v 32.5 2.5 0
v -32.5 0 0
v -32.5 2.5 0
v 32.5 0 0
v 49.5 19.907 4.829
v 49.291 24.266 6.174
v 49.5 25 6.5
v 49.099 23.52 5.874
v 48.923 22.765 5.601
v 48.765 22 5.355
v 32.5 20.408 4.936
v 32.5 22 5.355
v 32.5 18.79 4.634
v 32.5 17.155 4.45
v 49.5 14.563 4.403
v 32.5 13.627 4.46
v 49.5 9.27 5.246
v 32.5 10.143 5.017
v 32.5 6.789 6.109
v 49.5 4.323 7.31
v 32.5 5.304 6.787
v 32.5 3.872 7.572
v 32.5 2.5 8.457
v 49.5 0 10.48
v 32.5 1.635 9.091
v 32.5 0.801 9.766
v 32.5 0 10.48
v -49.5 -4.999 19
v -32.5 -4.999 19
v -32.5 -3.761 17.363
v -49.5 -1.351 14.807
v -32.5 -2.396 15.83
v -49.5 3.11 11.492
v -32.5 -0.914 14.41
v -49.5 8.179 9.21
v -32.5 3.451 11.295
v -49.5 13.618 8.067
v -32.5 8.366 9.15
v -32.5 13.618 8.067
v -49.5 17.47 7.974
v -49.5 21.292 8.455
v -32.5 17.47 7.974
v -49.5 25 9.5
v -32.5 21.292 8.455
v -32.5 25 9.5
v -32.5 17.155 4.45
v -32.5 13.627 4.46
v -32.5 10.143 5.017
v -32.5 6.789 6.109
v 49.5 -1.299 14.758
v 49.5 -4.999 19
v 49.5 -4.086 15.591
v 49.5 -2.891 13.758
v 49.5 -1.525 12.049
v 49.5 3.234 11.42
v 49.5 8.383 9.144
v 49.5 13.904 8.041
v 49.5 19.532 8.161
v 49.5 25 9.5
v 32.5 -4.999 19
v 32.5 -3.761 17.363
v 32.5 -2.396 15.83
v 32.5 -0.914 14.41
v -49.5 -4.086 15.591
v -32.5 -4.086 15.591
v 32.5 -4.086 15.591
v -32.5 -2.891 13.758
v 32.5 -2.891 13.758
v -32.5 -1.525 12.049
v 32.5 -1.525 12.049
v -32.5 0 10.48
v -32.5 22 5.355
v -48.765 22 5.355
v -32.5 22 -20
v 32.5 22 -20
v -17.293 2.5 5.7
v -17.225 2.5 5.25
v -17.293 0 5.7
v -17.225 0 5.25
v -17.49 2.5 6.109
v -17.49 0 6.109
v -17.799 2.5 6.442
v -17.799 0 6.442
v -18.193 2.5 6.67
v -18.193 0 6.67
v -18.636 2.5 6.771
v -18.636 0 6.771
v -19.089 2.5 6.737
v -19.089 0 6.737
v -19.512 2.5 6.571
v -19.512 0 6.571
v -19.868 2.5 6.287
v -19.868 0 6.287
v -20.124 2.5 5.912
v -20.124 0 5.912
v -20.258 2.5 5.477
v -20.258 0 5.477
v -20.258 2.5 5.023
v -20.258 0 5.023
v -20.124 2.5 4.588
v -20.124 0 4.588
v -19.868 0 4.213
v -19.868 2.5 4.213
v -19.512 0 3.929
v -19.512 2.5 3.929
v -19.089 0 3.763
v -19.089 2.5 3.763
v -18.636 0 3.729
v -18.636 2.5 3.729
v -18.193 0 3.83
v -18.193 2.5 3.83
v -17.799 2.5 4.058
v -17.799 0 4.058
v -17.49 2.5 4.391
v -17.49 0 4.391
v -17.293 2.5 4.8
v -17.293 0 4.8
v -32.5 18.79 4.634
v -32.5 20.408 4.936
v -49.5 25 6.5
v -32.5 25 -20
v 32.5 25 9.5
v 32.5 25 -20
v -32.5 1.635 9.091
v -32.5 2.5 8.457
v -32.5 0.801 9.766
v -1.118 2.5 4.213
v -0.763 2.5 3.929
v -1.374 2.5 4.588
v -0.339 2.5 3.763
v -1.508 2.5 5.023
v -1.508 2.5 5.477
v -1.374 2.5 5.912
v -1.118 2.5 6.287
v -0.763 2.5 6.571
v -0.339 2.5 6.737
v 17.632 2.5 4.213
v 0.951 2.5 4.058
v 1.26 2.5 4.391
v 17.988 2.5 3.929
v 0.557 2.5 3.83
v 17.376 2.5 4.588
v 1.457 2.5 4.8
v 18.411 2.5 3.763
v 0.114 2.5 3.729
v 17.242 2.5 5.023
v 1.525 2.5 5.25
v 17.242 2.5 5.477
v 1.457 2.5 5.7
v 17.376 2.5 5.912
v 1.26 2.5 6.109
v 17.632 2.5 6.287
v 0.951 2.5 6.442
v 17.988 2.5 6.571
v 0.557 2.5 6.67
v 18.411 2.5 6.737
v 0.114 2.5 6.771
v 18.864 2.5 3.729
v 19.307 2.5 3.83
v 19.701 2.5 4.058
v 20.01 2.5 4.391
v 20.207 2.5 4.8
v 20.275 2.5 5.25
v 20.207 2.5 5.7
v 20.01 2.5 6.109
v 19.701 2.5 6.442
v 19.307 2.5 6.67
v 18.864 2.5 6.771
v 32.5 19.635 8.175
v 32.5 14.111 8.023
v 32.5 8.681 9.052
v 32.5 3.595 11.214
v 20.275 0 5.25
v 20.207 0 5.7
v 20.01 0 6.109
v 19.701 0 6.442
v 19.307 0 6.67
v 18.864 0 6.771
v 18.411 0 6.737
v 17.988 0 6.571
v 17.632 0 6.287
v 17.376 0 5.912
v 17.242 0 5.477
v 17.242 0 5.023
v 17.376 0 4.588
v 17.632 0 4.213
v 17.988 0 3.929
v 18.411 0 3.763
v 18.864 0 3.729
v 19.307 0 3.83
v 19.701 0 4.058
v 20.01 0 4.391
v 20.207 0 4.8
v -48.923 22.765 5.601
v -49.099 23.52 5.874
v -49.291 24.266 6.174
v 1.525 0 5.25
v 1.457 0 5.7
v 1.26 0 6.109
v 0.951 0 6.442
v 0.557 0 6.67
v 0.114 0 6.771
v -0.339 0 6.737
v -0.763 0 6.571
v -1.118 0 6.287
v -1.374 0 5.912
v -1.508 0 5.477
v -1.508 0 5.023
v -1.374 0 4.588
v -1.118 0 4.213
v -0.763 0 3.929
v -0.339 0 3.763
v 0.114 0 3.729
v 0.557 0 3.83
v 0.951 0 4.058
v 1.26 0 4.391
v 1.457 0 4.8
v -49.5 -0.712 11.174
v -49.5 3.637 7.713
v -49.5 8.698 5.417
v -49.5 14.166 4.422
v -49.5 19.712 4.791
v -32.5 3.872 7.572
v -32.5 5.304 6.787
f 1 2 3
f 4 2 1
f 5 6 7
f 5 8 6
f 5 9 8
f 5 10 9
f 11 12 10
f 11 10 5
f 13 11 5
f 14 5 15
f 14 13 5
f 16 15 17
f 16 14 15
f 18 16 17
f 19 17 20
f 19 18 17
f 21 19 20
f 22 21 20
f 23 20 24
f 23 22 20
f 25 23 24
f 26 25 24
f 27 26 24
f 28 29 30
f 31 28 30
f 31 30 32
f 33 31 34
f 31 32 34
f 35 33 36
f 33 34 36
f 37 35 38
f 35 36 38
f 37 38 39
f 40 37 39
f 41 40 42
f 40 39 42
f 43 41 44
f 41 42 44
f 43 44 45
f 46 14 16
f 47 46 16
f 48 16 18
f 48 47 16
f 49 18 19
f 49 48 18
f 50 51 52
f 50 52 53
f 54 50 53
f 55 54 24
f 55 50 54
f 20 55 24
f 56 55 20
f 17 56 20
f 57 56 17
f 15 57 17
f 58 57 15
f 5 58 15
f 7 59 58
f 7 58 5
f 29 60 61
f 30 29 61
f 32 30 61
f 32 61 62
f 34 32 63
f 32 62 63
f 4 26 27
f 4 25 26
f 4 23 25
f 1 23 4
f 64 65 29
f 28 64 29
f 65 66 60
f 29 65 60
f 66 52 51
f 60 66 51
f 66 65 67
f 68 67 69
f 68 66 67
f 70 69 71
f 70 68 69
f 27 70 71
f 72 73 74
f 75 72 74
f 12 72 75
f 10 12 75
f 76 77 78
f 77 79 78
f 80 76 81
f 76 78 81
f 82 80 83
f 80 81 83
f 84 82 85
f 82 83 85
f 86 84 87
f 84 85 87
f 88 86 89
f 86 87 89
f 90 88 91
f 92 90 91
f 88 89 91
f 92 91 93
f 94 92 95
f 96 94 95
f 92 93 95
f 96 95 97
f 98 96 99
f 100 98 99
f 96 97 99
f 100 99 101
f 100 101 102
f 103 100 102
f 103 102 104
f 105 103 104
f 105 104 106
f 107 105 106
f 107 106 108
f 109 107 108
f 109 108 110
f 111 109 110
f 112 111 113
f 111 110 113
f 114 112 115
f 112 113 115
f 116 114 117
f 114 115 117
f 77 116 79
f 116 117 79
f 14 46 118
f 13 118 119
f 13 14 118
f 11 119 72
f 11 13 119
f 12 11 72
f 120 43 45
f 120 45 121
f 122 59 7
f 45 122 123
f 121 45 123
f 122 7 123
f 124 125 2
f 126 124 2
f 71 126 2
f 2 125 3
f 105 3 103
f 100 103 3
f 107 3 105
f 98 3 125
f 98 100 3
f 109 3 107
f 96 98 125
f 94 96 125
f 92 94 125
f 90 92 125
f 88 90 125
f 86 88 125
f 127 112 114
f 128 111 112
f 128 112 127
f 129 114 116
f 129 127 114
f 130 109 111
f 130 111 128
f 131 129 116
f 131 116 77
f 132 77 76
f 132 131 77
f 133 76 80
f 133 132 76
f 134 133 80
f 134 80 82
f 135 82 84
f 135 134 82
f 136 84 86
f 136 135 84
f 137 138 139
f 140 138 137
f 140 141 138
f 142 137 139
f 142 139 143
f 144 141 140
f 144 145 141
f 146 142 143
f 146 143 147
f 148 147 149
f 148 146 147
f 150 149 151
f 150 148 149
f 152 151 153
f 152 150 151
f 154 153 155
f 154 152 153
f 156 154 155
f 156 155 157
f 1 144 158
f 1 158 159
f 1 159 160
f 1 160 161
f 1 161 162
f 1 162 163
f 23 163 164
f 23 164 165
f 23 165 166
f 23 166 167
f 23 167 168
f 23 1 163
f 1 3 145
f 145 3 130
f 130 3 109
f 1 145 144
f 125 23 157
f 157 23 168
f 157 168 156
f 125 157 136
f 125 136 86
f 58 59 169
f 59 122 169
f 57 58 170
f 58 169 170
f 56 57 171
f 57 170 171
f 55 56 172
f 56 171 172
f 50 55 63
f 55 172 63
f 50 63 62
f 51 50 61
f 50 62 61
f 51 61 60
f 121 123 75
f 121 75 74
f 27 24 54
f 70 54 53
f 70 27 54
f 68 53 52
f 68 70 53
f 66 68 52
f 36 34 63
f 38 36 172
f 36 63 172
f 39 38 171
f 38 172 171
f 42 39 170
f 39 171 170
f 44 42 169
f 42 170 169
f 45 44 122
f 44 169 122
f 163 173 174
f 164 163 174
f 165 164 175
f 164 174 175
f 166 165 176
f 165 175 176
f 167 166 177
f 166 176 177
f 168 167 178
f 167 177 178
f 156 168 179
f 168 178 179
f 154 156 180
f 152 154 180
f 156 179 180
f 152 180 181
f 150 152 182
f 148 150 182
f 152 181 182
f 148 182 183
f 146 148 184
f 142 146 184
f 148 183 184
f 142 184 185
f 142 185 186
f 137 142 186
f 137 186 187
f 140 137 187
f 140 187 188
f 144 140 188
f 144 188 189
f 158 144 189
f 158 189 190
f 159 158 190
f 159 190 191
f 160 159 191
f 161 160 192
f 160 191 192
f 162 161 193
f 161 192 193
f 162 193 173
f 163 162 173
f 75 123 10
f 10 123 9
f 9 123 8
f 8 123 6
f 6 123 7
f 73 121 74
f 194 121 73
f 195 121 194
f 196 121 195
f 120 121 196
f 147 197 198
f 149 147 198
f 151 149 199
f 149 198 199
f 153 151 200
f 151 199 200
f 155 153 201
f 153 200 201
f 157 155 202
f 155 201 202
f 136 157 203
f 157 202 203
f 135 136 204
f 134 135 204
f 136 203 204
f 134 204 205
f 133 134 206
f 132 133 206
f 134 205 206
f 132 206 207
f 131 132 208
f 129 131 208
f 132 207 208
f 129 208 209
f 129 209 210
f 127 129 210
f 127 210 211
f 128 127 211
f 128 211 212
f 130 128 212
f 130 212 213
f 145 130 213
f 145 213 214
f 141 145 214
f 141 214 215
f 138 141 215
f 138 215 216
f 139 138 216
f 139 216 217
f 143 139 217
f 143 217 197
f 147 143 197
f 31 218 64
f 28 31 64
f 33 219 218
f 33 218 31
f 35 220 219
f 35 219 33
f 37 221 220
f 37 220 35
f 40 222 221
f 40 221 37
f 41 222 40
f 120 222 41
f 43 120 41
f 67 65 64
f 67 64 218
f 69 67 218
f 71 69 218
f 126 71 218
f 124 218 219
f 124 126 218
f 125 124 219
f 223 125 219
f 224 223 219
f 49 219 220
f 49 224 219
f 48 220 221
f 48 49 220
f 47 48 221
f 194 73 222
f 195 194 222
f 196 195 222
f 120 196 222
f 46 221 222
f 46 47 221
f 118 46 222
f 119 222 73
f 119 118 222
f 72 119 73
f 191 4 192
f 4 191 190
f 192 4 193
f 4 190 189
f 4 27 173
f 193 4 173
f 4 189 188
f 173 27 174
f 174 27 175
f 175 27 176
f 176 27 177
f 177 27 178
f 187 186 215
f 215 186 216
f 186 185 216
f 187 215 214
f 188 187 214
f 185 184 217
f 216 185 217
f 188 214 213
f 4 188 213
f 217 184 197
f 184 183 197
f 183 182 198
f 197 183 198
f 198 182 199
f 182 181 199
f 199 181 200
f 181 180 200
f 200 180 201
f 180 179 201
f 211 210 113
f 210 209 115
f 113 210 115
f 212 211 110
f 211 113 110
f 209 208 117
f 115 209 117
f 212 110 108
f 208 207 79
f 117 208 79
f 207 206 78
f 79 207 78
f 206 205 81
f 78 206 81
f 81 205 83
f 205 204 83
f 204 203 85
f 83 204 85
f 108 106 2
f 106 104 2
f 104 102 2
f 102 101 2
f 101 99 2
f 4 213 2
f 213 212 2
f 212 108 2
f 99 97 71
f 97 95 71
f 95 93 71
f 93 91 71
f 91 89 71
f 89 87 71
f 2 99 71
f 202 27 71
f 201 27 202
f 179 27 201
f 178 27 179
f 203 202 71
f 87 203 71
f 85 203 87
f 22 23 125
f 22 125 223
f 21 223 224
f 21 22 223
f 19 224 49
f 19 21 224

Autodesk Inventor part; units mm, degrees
ref_plane "YZ Plane" through (0, 0, 0) normal (1, 0, 0) x (0, 1, 0)
ref_plane "XZ Plane" through (0, 0, 0) normal (0, 1, 0) x (-1, 0, 0)
ref_plane "XY Plane" through (0, 0, 0) normal (0, 0, 1) x (1, 0, 0)
sketch "Sketch1" plane through (0, 0, 0) normal (0, 1, 0) x (-1, 0, 0)
  line L0 (0, 0) -> (32.5, 0)
  line L1 (32.5, 0) -> (-32.5, 0)
  line L2 (-32.5, 0) -> (-32.5, 19)
  line L3 (-32.5, 19) -> (32.5, 19)
  line L4 (32.5, 19) -> (32.5, 0)
  dimension "d0" = 32.5
  dimension "d1" = 65
  dimension "d2" = 19
extrude "Extrusion1" add sketch "Sketch1" along normal blind 25
sketch "Sketch2" plane through (32.5, 0, 19) normal (1, 0, 0) x (0, 0, -1)
  line L0 (19, 0) -> (8, 0)
  line L1 (0, 0) -> (19, 0)
  line L2 (8, 0) -> (0, -2.143594)
  line L3 (0, -2.143594) -> (0, 0)
  dimension "d5" = 11
  dimension "d6" = 165
extrude "Extrusion2" add sketch "Sketch2" against normal up to surface (65 mm away)
sketch "Sketch3" plane through (32.5, 0, 0) normal (1, 0, 0) x (0, 0, -1)
  line L0 (-19, -2.143594) -> (-19, 25)
  line L1 (-19, 25) -> (0, 25)
  line L2 (-19, 25) -> (-19, -5)
  arc A0 (-19, -5) -> (-9.5, 25) centre (-33.73129, 16.169075) ccw
  line L3 (-19, -2.143594) -> (-11, 0)
  line L4 (-19, -5) -> (-11, 0)
  line L5 (-19, -2.143594) -> (-19, 25)
  line L6 (-19, 25) -> (-9.5, 25)
  point P0 (0, 0)
  point P1 (-14.409764, -0.913643)
  dimension "d59" = 30
extrude "Extrusion3" cut sketch "Sketch3" against normal blind 81.4375 contours L0 L1 A0 L3
sketch "Sketch4" plane through (0, 0, 0) normal (0, -1, 0) x (1, 0, 0)
  line L0 (-32.5, 0) -> (-32.5, 11) projected
  line L1 (-32.5, 0) -> (-32.5, 10.5)
  line L2 (-32.5, 10.5) -> (32.5, 10.5)
  line L3 (32.5, 11) -> (32.5, 0) projected
  line L4 (-32.5, 0) -> (-32.5, 5.25)
  line L5 (-32.5, 5.25) -> (32.5, 5.25)
  line L6 (-32.5, 5.25) -> (-18.75, 5.25)
  line L7 (-18.75, 5.25) -> (0, 5.25)
  line L8 (0, 5.25) -> (18.75, 5.25)
  line L9 (18.75, 5.25) -> (32.5, 5.25)
  circle A0 centre (18.75, 5.25) radius 1.525
  circle A1 centre (0, 5.25) radius 1.525
  circle A2 centre (-18.75, 5.25) radius 1.525
  point P0 (0, 0)
  point P1 (-17.225, 5.25)
  point P2 (-20.275, 5.25)
  point P3 (1.525, 5.25)
  point P4 (-1.525, 5.25)
  point P5 (20.275, 5.25)
  point P6 (17.225, 5.25)
  dimension "d12" = 10.5
  dimension "d13" = 5.25
  dimension "d14" = 13.75
  dimension "d15" = 18.75
  dimension "d16" = 18.75
  dimension "d17" = 3.05
  dimension "d18" = 3.05
  dimension "d19" = 3.05
extrude "Extrusion4" cut sketch "Sketch4" against normal blind 4 contours A2 L5 | L5 A2 | A1 L5 | L5 A1 | A0 L5 | L5 A0
sketch "Sketch5" plane through (32.5, 0, 0) normal (0, 0, -1) x (-1, 0, 0)
  line L0 (0, 25) -> (65, 25)
  line L1 (65, 25) -> (65, -2.143594)
  line L2 (0, 25) -> (65, 25)
  line L3 (65, 25) -> (65, 22)
  line L4 (65, 22) -> (0, 22)
  line L5 (0, 22) -> (0, 25)
  point P0 (32.5, 0)
  dimension "d22" = 3
sketch "Sketch6" plane through (32.5, 0, 0) normal (1, 0, 0) x (0, 0, -1)
  line L0 (0, 0) -> (-11, 0)
  line L1 (0, 0) -> (-10, 0)
  line L2 (-11, 0) -> (0, 0)
  line L3 (-19, 25) -> (0, 25)
  arc A0 (-11, 0) -> (-6.906688, 25) centre (-24.791662, 15.093247) ccw
  line L4 (0, 0) -> (0, 25)
  line L5 (0, 25) -> (0, 22)
  line L6 (0, 22) -> (-5.548149, 22)
  line L7 (0, 0) -> (0, 2.5)
  line L8 (0, 2.5) -> (-8.68495, 2.5)
  point P0 (-9.5, 25)
  dimension "d23" = 10
  dimension "d24" = 3
  dimension "d25" = 2.5
extrude "Extrusion5" cut sketch "Sketch6" against normal blind 113.5375 contours L8 A0 L6 L4
extrude "Extrusion6" add sketch "Sketch5" along normal blind 20
sketch "Sketch12" plane through (0, 25, 0) normal (0, 1, 0) x (1, 0, 0)
  line L0 (0, 0) -> (0, -9.5)
  line L1 (49.5, -9.5) -> (-49.5, -9.5)
  line L2 (0, -9.5) -> (0, 0)
  line L3 (0, -9.5) -> (0, -6)
  line L4 (0, -6) -> (8.228384, -6)
  line L5 (8.228384, -6) -> (-5.400421, -6)
  dimension "d85" = 3.5
sketch "Sketch14" plane through (32.5, 0, 11) normal (1, 0, 0) x (0, 0, -1)
  line L0 (11, 0) -> (0, 0)
  line L1 (0, 0) -> (9.434, 0) construction
  arc A0 (-3.409764, -0.913643) -> (1.5, 25) centre (-22.73129, 16.169075) ccw
  line L2 (1.5, 25) -> (31, 25)
  arc A1 (-8.000486, -4.999258) -> (1.5, 25) centre (-22.726506, 16.168322) ccw
  line L3 (-3.409764, -0.913643) -> (0, 0)
  line L4 (-3.409764, -0.913643) -> (0, 0)
  line L5 (-8.000486, -4.999258) -> (-4.590768, -4.085627)
  line L6 (-8.000486, -4.999258) -> (-4.470486, -4.999258) construction
  line L7 (-4.590768, -4.085627) -> (0, 0)
  point P0 (28, 25)
  point P1 (-2.386043, 0.31942)
  dimension "d60" = 9.434
  dimension "d62" = 3.53
  dimension "d63" = 15
extrude "Extrusion12" add sketch "Sketch14" against normal up to surface (65 mm away)
sketch "Sketch15" plane through (32.5, 0, 0) normal (1, 0, 0) x (0, 0, -1)
  arc A0 (-19.000486, -4.999258) -> (-13.386043, 0.31942) centre (-33.726506, 16.168322) ccw
  line L0 (-9.5, 25) -> (20, 25)
  arc A1 (-19.000486, -4.999258) -> (-9.5, 25) centre (-33.729569, 16.169292) ccw
  line L1 (-9.5, 25) -> (-6.5, 25)
  line L2 (-19.000486, -4.999258) -> (-15.590768, -4.085627)
  arc A2 (-15.590768, -4.085627) -> (-6.5, 25) centre (-27.017687, 15.44936) ccw
  line L3 (-15.590768, -4.085627) -> (-11, 0)
  line L4 (-19.000486, -4.999258) -> (-15.590768, -4.085627)
  line L5 (-9.5, 25) -> (-6.5, 25)
  line L6 (-9.5, 25) -> (20, 25)
  point P0 (0, 0)
  point P1 (17, 25)
  dimension "d66" = 3
extrude "Extrusion13" add sketch "Sketch15" against normal blind 65
sketch "Sketch16" plane through (32.5, 0, 0) normal (1, 0, 0) x (0, 0, -1)
  line L0 (-19.000486, -4.999258) -> (-15.590768, -4.085627)
  arc A0 (-8.067422, 13.618284) -> (-9.5, 25) centre (-33.73129, 16.169075) ccw
  arc A1 (-19.000486, -4.999258) -> (-9.5, 25) centre (-33.729569, 16.169292) ccw
  line L1 (-9.5, 25) -> (20, 25)
  line L2 (-9.5, 25) -> (-6.5, 25)
  arc A2 (-15.590768, -4.085627) -> (-10.479625, 0) centre (-27.017687, 15.44936) ccw
  arc A3 (-6.108674, 6.78891) -> (-4.450402, 17.154601) centre (-24.791662, 15.093247) ccw
  arc A4 (-15.590768, -4.085627) -> (-6.5, 25) centre (-27.017687, 15.44936) ccw
  line L3 (-19.000486, -4.999258) -> (-15.590768, -4.085627)
  line L4 (-9.5, 25) -> (-6.5, 25)
  point P0 (0, 0)
  point P1 (17, 25)
  point P2 (-10.479625, 0)
  dimension "d69" = 3
sketch "Sketch16 outline for Extrusion14" plane through (32.5, 0, 0) normal (1, 0, 0) x (0, 0, -1)
  arc A0 (-10.479625, 0) -> (-6.5, 25) centre (-27.017687, 15.44936) ccw
  arc A1 (-15.590768, -4.085627) -> (-10.479625, 0) centre (-27.017687, 15.44936) ccw
  line L0 (-19.000486, -4.999258) -> (-15.590768, -4.085627)
  arc A2 (-9.5, 25) -> (-19.000486, -4.999258) centre (-33.729569, 16.169292) cw
  line L1 (-6.5, 25) -> (-9.5, 25)
extrude "Extrusion14" add sketch "Sketch16 outline for Extrusion14" along normal blind 17
sketch "Sketch17" plane through (-32.5, 0, 0) normal (-1, 0, 0) x (0, 0, 1)
  line L0 (9.5, 25) -> (-20, 25)
  line L1 (19.000486, -4.999258) -> (15.590768, -4.085627)
  arc A0 (8.067422, 13.618284) -> (19.000486, -4.999258) centre (33.729569, 16.169292) ccw
  arc A1 (9.5, 25) -> (19.000486, -4.999258) centre (33.729569, 16.169292) ccw
  line L2 (9.5, 25) -> (6.5, 25)
  arc A2 (4.450402, 17.154601) -> (6.108674, 6.78891) centre (24.791662, 15.093247) ccw
  arc A3 (6.5, 25) -> (15.590768, -4.085627) centre (27.017687, 15.44936) ccw
  line L3 (15.590768, -4.085627) -> (19.000486, -4.999258)
  point P0 (0, 0)
  point P1 (-17, 25)
  dimension "d72" = 3
sketch "Sketch17 outline for Extrusion15" plane through (-32.5, 0, 0) normal (-1, 0, 0) x (0, 0, 1)
  arc A0 (6.5, 25) -> (15.590768, -4.085627) centre (27.017687, 15.44936) ccw
  line L0 (9.5, 25) -> (6.5, 25)
  arc A1 (8.067422, 13.618284) -> (9.5, 25) centre (33.729569, 16.169292) cw
  arc A2 (19.000486, -4.999258) -> (8.067422, 13.618284) centre (33.729569, 16.169292) cw
  line L1 (15.590768, -4.085627) -> (19.000486, -4.999258)
extrude "Extrusion15" add sketch "Sketch17 outline for Extrusion15" along normal blind 17
sketch "Sketch18" plane through (-32.5, 15.093247, 24.791662) normal (-1, 0, 0) x (0, 0.1579684, 0.9874442)
  arc A0 (-16.497042, 12.67187) -> (-18.101737, 9.890438) centre (2.25433, 0) ccw
  arc A1 (-18.11904, -9.854746) -> (-16.516593, -12.64289) centre (2.25433, 0) ccw
  arc A2 (-18.101737, 9.890438) -> (-18.11904, -9.854746) centre (2.25433, 0) ccw
  arc A3 (-19.76023, 5.248748) -> (-19.76023, -5.248748) centre (2.25433, 0) ccw
  arc A4 (-19.76023, 5.248748) -> (-19.76023, -5.248748) centre (0, 0) ccw
  point P0 (-26.864638, -10.98744)
sketch "Sketch18 outline for Extrusion16" plane through (-32.5, 15.093247, 24.791662) normal (-1, 0, 0) x (0, 0.1579684, 0.9874442)
  arc A0 (-19.76023, 5.248748) -> (-19.76023, -5.248748) centre (0, 0) ccw
  arc A1 (-19.76023, -5.248748) -> (-19.76023, 5.248748) centre (2.25433, 0) cw
extrude "Extrusion16" cut sketch "Sketch18 outline for Extrusion16" against normal blind 66.2125
sketch "Sketch20" plane through (0, 25, 0) normal (0, 1, 0) x (1, 0, 0)
  arc A0 (32.5, 17) -> (29.5, 20) centre (29.5, 17) ccw
  line L0 (32.5, -6.5) -> (49.5, -6.5)
  line L1 (-32.5, 20) -> (-32.5, -5.354831)
  line L2 (49.5, -6.5) -> (32.5, -6.5)
  line L3 (-32.5, -6.5) -> (-32.5, -5.354831)
  line L4 (-32.5, 17) -> (-32.5, -6.5)
  line L5 (-32.5, -6.5) -> (-49.5, -6.5)
  line L6 (32.5, -6.5) -> (32.5, 20)
  line L7 (32.5, 17) -> (32.5, -6.5)
  line L8 (32.5, 20) -> (49.5, -6.5)
  line L9 (-32.5, 20) -> (32.5, 20)
  line L10 (-32.5, 20) -> (-49.5, -6.5)
  point P0 (0, 0)
sketch "Sketch21" plane through (-49.5, 0, 0) normal (-1, 0, 0) x (0, 0, 1)
  arc A0 (9.5, 25) -> (19.000486, -4.999258) centre (33.729569, 16.169292) ccw
  line L0 (9.5, 25) -> (19.000486, -4.999258)
  point P0 (0, 0)
extrude "Extrusion18" cut sketch "Sketch21" against normal blind 124.3
extrude "Extrusion19" add sketch "Sketch20" against normal up to surface (3 mm away) contours L6 L8 L0 | L1 L3 L5 L10
properties part number "slope"
